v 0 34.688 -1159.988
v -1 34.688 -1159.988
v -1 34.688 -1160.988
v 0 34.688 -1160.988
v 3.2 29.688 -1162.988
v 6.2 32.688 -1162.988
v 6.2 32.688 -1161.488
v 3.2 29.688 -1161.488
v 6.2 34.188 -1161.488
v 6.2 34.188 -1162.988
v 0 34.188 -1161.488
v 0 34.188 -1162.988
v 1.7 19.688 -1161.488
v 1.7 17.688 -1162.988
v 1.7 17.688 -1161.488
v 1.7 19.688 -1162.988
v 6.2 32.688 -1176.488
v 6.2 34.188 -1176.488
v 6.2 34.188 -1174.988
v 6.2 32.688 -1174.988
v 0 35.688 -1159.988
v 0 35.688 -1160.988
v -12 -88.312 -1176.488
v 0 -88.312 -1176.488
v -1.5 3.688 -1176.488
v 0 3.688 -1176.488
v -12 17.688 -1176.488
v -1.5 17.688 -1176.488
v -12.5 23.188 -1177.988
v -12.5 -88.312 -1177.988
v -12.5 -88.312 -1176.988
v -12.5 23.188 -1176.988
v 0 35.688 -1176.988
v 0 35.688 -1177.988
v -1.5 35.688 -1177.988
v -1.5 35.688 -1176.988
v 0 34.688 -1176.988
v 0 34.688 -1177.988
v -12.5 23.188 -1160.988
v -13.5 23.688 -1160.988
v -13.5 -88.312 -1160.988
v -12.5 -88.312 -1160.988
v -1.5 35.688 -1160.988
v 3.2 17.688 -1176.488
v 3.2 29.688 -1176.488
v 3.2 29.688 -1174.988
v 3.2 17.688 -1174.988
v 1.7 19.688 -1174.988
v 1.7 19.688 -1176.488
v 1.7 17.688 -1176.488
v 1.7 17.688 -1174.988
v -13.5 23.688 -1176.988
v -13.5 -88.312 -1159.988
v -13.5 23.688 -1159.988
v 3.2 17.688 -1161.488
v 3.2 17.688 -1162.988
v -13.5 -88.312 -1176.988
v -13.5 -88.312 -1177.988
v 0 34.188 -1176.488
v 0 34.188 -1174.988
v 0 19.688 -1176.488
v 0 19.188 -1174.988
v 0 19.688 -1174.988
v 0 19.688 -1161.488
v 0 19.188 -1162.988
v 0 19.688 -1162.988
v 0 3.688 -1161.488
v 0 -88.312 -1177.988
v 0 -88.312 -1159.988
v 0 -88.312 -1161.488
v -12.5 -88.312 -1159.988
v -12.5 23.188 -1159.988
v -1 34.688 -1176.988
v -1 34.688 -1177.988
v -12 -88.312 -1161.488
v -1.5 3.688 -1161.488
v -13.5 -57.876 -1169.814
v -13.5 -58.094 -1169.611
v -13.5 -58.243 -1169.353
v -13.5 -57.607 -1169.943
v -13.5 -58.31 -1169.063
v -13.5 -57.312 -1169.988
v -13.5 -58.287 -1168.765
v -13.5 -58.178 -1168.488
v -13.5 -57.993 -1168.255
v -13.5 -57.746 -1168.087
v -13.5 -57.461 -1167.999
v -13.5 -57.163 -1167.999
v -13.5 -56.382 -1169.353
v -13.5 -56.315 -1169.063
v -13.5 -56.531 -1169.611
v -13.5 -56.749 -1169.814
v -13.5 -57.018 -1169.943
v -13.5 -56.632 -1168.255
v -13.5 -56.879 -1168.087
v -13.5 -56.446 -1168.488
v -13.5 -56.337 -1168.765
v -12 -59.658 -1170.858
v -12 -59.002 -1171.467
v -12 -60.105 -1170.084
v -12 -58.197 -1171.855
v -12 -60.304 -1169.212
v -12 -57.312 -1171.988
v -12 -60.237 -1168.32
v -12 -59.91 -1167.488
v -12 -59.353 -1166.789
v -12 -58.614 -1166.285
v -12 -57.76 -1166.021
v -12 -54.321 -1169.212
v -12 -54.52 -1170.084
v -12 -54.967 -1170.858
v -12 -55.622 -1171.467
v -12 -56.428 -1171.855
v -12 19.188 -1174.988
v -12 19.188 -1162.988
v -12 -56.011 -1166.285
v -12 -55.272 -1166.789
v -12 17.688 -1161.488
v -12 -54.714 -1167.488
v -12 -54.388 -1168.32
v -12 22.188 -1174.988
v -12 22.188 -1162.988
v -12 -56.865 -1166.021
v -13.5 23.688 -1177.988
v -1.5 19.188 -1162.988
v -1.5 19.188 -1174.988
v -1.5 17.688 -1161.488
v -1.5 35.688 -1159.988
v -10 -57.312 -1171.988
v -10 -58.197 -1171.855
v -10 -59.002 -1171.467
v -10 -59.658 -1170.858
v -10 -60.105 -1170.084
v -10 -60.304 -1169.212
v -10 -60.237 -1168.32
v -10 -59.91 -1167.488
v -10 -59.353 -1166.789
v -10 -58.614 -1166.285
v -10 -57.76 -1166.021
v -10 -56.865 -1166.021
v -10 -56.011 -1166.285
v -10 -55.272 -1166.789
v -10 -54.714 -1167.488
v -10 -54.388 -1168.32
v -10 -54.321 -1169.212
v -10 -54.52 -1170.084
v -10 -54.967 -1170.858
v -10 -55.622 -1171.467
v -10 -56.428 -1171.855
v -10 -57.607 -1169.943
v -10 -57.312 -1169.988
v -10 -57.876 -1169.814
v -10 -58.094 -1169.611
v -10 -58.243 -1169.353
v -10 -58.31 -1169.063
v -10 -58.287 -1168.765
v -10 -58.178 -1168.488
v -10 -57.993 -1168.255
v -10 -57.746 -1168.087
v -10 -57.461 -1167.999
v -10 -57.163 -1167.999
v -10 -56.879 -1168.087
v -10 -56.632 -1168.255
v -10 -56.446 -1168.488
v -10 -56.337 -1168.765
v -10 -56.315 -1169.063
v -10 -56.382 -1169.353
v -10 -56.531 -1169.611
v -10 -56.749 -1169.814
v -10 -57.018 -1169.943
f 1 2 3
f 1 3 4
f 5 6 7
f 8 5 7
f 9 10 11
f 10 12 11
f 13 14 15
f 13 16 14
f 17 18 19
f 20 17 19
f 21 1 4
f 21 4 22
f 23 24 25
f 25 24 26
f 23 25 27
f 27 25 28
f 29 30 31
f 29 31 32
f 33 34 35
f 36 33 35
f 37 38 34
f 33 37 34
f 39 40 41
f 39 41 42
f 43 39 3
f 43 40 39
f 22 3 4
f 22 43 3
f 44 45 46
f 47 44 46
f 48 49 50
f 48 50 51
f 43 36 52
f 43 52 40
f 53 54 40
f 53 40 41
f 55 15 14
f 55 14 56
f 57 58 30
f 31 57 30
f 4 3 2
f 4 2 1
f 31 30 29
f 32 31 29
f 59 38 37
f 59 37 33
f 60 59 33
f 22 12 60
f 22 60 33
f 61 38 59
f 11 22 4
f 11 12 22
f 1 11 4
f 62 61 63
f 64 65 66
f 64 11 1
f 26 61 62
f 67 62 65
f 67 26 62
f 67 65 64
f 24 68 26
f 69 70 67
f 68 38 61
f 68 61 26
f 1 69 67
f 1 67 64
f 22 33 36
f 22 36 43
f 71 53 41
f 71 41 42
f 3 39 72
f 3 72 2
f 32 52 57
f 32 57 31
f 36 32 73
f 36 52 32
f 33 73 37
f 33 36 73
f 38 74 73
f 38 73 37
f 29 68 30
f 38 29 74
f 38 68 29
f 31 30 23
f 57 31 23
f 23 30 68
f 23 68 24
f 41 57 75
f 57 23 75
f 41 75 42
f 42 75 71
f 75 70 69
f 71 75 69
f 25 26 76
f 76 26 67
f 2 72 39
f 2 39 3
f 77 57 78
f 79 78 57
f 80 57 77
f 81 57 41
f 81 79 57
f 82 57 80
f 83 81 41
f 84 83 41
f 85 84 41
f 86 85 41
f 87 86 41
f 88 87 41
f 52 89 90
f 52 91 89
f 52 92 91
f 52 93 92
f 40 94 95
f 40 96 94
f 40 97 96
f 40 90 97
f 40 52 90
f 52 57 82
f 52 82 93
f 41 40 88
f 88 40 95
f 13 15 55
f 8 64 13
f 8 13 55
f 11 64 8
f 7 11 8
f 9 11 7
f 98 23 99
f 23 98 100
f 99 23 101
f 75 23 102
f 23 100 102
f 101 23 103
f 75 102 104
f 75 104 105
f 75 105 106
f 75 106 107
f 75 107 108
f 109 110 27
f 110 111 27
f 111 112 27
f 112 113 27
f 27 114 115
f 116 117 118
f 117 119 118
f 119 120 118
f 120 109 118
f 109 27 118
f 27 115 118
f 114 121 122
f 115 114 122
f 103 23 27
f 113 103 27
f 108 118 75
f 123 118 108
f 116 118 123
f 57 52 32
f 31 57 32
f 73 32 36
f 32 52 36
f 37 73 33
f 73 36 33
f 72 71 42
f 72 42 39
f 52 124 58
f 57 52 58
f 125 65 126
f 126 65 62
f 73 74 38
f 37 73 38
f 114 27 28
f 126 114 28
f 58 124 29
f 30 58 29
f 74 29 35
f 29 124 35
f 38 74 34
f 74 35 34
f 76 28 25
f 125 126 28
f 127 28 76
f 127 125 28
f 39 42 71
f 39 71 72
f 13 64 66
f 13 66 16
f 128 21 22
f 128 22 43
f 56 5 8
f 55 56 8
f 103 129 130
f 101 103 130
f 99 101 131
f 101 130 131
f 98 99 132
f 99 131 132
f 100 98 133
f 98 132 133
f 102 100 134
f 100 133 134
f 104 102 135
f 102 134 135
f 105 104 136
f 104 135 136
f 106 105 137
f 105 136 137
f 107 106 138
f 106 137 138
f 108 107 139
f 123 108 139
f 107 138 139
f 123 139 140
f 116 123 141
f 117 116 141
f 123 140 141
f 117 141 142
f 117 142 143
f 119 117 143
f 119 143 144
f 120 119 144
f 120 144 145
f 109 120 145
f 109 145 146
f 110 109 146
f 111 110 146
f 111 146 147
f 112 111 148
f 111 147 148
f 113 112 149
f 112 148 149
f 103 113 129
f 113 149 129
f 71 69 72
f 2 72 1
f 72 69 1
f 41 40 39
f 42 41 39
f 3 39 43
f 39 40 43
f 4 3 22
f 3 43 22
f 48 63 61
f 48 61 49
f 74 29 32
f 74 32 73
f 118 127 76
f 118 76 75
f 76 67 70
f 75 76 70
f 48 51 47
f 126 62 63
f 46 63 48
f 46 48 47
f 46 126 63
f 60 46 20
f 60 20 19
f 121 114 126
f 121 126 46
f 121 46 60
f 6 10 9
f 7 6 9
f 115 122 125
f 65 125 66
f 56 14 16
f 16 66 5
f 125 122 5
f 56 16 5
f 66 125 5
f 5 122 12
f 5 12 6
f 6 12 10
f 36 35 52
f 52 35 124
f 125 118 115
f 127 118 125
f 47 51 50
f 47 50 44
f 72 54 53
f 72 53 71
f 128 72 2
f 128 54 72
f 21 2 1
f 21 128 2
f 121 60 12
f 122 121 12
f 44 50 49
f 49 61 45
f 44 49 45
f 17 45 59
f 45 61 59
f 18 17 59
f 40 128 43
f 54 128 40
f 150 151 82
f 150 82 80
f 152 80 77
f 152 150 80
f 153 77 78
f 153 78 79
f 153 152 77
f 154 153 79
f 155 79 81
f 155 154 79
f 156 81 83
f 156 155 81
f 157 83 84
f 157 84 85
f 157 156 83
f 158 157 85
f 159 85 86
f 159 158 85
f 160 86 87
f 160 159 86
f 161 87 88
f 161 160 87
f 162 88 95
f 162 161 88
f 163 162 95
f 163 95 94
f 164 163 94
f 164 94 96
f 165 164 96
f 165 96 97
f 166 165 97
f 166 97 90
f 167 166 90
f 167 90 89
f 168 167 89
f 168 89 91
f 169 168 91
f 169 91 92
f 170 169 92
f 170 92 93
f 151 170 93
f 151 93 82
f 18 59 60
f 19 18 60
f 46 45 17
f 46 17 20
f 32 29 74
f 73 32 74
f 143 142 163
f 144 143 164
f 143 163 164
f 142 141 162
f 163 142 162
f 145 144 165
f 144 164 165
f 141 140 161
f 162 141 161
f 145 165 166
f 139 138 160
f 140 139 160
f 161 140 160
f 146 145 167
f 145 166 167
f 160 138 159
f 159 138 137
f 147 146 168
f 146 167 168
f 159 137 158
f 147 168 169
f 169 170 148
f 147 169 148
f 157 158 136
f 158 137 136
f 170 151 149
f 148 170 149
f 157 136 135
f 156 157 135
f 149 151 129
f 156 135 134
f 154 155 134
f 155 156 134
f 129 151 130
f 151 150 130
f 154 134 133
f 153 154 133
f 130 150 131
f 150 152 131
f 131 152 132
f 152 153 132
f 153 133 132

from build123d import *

# Parameters (mm, degrees)
SKETCH1_W            = 1.5
SKETCH1_H            = 92
BOSS_EXTRUDE1_DEPTH  = 12
BOSS_EXTRUDE5_DEPTH  = 1.5
BOSS_EXTRUDE6_START  = 12
SKETCH1_7_W          = 1.5
SKETCH1_7_H          = 15
BOSS_EXTRUDE6_DEPTH  = 15.2
BOSS_EXTRUDE3_START  = 12
SKETCH1_4_W          = 18
SKETCH1_4_H          = 124
SKETCH1_4_R          = 1
BOSS_EXTRUDE3_DEPTH  = 1.5
BOSS_EXTRUDE4_START  = 10
SKETCH1_5_R          = 3
SKETCH1_5_R_2        = 1
BOSS_EXTRUDE4_DEPTH  = 2
BOSS_EXTRUDE12_START = -3.2
SKETCH1_9_W          = 1.5
SKETCH1_9_H          = 1.5
BOSS_EXTRUDE12_DEPTH = 3
SKETCH4_W            = 1.5
SKETCH4_H            = 1.5
BOSS_EXTRUDE10_DEPTH = 1.5
SKETCH4_4_W          = 1.7
SKETCH4_4_H          = 1.5
CUT_EXTRUDE5_DEPTH   = 0.5
CHAMFER1_SIZE        = 12
CHAMFER2_SIZE        = 1.5
CUT_EXTRUDE1_START   = -1
CUT_EXTRUDE1_DEPTH   = 1
CUT_EXTRUDE2_START   = -18
CUT_EXTRUDE2_DEPTH   = 1
BOSS_EXTRUDE7_DEPTH  = 1
BOSS_EXTRUDE8_START  = -18
BOSS_EXTRUDE8_DEPTH  = 1
CHAMFER3_SIZE        = 3


# Read off the part's stored shape, not the designer's step: Cut-Extrude1, Cut-Extrude2
with BuildPart() as part:
    # Sketch1 → Boss-Extrude1 (new body)
    with BuildSketch(Plane.ZY):
        Polygon((-1176.487890925, 3.687580965), (-1176.487890925, 19.187580965), (-1176.487890925, 32.687580965), (-1176.487890925, 34.187580965), (-1174.987890925, 34.187580965), (-1162.987890925, 34.187580965), (-1161.487890925, 34.187580965), (-1161.487890925, 32.687580965), (-1161.487890925, 19.187580965), (-1161.487890925, 3.687580965), (-1159.987890925, 3.687580965), (-1159.987890925, 35.687580965), (-1177.987890925, 35.687580965), (-1177.987890925, 3.687580965), align=None)
        with Locations((-1160.737890925, -42.312419035)):
            Rectangle(SKETCH1_W, SKETCH1_H)
        with Locations((-1177.237890925, -42.312419035)):
            Rectangle(SKETCH1_W, SKETCH1_H)
    extrude(amount=BOSS_EXTRUDE1_DEPTH)

    # Sketch1<6> → Boss-Extrude5 (add)
    with BuildSketch(Plane.ZY):
        Polygon((-1174.987890925, 19.187580965), (-1176.487890925, 19.187580965), (-1176.487890925, 3.687580965), (-1161.487890925, 3.687580965), (-1161.487890925, 19.187580965), (-1162.987890925, 19.187580965), align=None)
    extrude(amount=BOSS_EXTRUDE5_DEPTH)

    # Sketch1<7> → Boss-Extrude6 (add)
    with BuildSketch(Plane.ZY.offset(BOSS_EXTRUDE6_START)):
        with Locations((-1175.737890925, 26.687580965)):
            Rectangle(SKETCH1_7_W, SKETCH1_7_H)
        with Locations((-1162.237890925, 26.687580965)):
            Rectangle(SKETCH1_7_W, SKETCH1_7_H)
    extrude(amount=-BOSS_EXTRUDE6_DEPTH)

    # Sketch1<4> → Boss-Extrude3 (add)
    with BuildSketch(Plane.ZY.offset(BOSS_EXTRUDE3_START)):
        with Locations((-1168.987890925, -26.312419035)):
            Rectangle(SKETCH1_4_W, SKETCH1_4_H)
        with Locations(Location((-1168.987890925, -57.312419035, 0), (0, 0, 180))):
            Circle(SKETCH1_4_R, mode=Mode.SUBTRACT)
    extrude(amount=BOSS_EXTRUDE3_DEPTH)

    # Sketch1<5> → Boss-Extrude4 (add)
    with BuildSketch(Plane.ZY.offset(BOSS_EXTRUDE4_START)):
        with Locations(Location((-1168.987890925, -57.312419035, 0), (0, 0, 180))):
            Circle(SKETCH1_5_R)
        with Locations(Location((-1168.987890925, -57.312419035, 0), (0, 0, 180))):
            Circle(SKETCH1_5_R_2, mode=Mode.SUBTRACT)
    extrude(amount=BOSS_EXTRUDE4_DEPTH)

    # Sketch1<9> → Boss-Extrude12 (add)
    with BuildSketch(Plane.ZY.offset(BOSS_EXTRUDE12_START)):
        with Locations((-1162.237890925, 33.437580965)):
            Rectangle(SKETCH1_9_W, SKETCH1_9_H)
        with Locations((-1175.737890925, 33.437580965)):
            Rectangle(SKETCH1_9_W, SKETCH1_9_H)
    extrude(amount=-BOSS_EXTRUDE12_DEPTH)

    # Sketch4 → Boss-Extrude10 (add)
    with BuildSketch(Plane.XZ.offset(-19.187580965)):
        with Locations((2.45, -1162.237890925)):
            Rectangle(SKETCH4_W, SKETCH4_H)
        with Locations((2.45, -1175.737890925)):
            Rectangle(SKETCH4_W, SKETCH4_H)
    extrude(amount=BOSS_EXTRUDE10_DEPTH)

    # Sketch4<4> → Cut-Extrude5 (cut)
    with BuildSketch(Plane.XZ.offset(-19.187580965)):
        with Locations((0.85, -1162.237890925)):
            Rectangle(SKETCH4_4_W, SKETCH4_4_H)
        with Locations((0.85, -1175.737890925)):
            Rectangle(SKETCH4_4_W, SKETCH4_4_H)
    extrude(amount=-CUT_EXTRUDE5_DEPTH, mode=Mode.SUBTRACT)

    # Chamfer1
    chamfer1_edges = [part.edges().sort_by_distance(p)[0] for p in [
        (-12, 34.187580965, -1168.987890925),
        (-13.5, 35.687580965, -1168.987890925),
    ]]
    chamfer(chamfer1_edges, length=CHAMFER1_SIZE - 0.0001)  # a hair under: the kernel refuses the full size

    # Chamfer2
    chamfer2_edges = [part.edges().sort_by_distance(p)[0] for p in [
        (-6.75, 19.187580965, -1176.487890925),
        (-6.75, 19.187580965, -1161.487890925),
    ]]
    chamfer(chamfer2_edges, length=CHAMFER2_SIZE - 0.0001)  # a hair under: the kernel refuses the full size

    # Cut-Extrude1 outline → Cut-Extrude1 (cut)
    with BuildSketch(Plane.XY.offset(-1159.987890925).offset(CUT_EXTRUDE1_START)):
        Polygon((-12.5, 23.187580965), (-1, 34.687580965), (1, 34.687580965), (1, 37), (-15, 37), (-15, -88.312419035), (-12.5, -88.312419035), align=None)
    extrude(amount=CUT_EXTRUDE1_DEPTH, mode=Mode.SUBTRACT)

    # Cut-Extrude2 outline → Cut-Extrude2 (cut)
    with BuildSketch(Plane.XY.offset(-1159.987890925).offset(CUT_EXTRUDE2_START)):
        Polygon((-1, 34.687580965), (1, 34.687580965), (1, 37), (-15, 37), (-15, -88.312419035), (-12.5, -88.312419035), (-12.5, 23.187580965), align=None)
    extrude(amount=CUT_EXTRUDE2_DEPTH, mode=Mode.SUBTRACT)

    # Chamfer3
    chamfer3_edges = [part.edges().sort_by_distance(p)[0] for p in [
        (3.2, 32.687580965, -1175.737890925),
        (3.2, 32.687580965, -1162.237890925),
    ]]
    chamfer(chamfer3_edges, length=CHAMFER3_SIZE - 0.0001)  # a hair under: the kernel refuses the full size


with BuildPart() as body_2:
    # Sketch2<2> → Boss-Extrude7 (new body)
    with BuildSketch(Plane.XY.offset(-1159.987890925)):
        Polygon((0, 35.687580965), (-1.5, 35.687580965), (-13.5, 23.687580965), (-13.5, -88.312419035), (-12.5, -88.312419035), (-12.5, 23.187580965), (-1, 34.687580965), (0, 34.687580965), align=None)
    extrude(amount=-BOSS_EXTRUDE7_DEPTH)


with BuildPart() as body_3:
    # Sketch2<5> → Boss-Extrude8 (new body)
    with BuildSketch(Plane.XY.offset(-1159.987890925).offset(BOSS_EXTRUDE8_START)):
        Polygon((0, 35.687580965), (-1.5, 35.687580965), (-13.5, 23.687580965), (-13.5, -88.312419035), (-12.5, -88.312419035), (-12.5, 23.187580965), (-1, 34.687580965), (0, 34.687580965), align=None)
    extrude(amount=BOSS_EXTRUDE8_DEPTH)


solid = Compound([part.part, body_2.part, body_3.part])
